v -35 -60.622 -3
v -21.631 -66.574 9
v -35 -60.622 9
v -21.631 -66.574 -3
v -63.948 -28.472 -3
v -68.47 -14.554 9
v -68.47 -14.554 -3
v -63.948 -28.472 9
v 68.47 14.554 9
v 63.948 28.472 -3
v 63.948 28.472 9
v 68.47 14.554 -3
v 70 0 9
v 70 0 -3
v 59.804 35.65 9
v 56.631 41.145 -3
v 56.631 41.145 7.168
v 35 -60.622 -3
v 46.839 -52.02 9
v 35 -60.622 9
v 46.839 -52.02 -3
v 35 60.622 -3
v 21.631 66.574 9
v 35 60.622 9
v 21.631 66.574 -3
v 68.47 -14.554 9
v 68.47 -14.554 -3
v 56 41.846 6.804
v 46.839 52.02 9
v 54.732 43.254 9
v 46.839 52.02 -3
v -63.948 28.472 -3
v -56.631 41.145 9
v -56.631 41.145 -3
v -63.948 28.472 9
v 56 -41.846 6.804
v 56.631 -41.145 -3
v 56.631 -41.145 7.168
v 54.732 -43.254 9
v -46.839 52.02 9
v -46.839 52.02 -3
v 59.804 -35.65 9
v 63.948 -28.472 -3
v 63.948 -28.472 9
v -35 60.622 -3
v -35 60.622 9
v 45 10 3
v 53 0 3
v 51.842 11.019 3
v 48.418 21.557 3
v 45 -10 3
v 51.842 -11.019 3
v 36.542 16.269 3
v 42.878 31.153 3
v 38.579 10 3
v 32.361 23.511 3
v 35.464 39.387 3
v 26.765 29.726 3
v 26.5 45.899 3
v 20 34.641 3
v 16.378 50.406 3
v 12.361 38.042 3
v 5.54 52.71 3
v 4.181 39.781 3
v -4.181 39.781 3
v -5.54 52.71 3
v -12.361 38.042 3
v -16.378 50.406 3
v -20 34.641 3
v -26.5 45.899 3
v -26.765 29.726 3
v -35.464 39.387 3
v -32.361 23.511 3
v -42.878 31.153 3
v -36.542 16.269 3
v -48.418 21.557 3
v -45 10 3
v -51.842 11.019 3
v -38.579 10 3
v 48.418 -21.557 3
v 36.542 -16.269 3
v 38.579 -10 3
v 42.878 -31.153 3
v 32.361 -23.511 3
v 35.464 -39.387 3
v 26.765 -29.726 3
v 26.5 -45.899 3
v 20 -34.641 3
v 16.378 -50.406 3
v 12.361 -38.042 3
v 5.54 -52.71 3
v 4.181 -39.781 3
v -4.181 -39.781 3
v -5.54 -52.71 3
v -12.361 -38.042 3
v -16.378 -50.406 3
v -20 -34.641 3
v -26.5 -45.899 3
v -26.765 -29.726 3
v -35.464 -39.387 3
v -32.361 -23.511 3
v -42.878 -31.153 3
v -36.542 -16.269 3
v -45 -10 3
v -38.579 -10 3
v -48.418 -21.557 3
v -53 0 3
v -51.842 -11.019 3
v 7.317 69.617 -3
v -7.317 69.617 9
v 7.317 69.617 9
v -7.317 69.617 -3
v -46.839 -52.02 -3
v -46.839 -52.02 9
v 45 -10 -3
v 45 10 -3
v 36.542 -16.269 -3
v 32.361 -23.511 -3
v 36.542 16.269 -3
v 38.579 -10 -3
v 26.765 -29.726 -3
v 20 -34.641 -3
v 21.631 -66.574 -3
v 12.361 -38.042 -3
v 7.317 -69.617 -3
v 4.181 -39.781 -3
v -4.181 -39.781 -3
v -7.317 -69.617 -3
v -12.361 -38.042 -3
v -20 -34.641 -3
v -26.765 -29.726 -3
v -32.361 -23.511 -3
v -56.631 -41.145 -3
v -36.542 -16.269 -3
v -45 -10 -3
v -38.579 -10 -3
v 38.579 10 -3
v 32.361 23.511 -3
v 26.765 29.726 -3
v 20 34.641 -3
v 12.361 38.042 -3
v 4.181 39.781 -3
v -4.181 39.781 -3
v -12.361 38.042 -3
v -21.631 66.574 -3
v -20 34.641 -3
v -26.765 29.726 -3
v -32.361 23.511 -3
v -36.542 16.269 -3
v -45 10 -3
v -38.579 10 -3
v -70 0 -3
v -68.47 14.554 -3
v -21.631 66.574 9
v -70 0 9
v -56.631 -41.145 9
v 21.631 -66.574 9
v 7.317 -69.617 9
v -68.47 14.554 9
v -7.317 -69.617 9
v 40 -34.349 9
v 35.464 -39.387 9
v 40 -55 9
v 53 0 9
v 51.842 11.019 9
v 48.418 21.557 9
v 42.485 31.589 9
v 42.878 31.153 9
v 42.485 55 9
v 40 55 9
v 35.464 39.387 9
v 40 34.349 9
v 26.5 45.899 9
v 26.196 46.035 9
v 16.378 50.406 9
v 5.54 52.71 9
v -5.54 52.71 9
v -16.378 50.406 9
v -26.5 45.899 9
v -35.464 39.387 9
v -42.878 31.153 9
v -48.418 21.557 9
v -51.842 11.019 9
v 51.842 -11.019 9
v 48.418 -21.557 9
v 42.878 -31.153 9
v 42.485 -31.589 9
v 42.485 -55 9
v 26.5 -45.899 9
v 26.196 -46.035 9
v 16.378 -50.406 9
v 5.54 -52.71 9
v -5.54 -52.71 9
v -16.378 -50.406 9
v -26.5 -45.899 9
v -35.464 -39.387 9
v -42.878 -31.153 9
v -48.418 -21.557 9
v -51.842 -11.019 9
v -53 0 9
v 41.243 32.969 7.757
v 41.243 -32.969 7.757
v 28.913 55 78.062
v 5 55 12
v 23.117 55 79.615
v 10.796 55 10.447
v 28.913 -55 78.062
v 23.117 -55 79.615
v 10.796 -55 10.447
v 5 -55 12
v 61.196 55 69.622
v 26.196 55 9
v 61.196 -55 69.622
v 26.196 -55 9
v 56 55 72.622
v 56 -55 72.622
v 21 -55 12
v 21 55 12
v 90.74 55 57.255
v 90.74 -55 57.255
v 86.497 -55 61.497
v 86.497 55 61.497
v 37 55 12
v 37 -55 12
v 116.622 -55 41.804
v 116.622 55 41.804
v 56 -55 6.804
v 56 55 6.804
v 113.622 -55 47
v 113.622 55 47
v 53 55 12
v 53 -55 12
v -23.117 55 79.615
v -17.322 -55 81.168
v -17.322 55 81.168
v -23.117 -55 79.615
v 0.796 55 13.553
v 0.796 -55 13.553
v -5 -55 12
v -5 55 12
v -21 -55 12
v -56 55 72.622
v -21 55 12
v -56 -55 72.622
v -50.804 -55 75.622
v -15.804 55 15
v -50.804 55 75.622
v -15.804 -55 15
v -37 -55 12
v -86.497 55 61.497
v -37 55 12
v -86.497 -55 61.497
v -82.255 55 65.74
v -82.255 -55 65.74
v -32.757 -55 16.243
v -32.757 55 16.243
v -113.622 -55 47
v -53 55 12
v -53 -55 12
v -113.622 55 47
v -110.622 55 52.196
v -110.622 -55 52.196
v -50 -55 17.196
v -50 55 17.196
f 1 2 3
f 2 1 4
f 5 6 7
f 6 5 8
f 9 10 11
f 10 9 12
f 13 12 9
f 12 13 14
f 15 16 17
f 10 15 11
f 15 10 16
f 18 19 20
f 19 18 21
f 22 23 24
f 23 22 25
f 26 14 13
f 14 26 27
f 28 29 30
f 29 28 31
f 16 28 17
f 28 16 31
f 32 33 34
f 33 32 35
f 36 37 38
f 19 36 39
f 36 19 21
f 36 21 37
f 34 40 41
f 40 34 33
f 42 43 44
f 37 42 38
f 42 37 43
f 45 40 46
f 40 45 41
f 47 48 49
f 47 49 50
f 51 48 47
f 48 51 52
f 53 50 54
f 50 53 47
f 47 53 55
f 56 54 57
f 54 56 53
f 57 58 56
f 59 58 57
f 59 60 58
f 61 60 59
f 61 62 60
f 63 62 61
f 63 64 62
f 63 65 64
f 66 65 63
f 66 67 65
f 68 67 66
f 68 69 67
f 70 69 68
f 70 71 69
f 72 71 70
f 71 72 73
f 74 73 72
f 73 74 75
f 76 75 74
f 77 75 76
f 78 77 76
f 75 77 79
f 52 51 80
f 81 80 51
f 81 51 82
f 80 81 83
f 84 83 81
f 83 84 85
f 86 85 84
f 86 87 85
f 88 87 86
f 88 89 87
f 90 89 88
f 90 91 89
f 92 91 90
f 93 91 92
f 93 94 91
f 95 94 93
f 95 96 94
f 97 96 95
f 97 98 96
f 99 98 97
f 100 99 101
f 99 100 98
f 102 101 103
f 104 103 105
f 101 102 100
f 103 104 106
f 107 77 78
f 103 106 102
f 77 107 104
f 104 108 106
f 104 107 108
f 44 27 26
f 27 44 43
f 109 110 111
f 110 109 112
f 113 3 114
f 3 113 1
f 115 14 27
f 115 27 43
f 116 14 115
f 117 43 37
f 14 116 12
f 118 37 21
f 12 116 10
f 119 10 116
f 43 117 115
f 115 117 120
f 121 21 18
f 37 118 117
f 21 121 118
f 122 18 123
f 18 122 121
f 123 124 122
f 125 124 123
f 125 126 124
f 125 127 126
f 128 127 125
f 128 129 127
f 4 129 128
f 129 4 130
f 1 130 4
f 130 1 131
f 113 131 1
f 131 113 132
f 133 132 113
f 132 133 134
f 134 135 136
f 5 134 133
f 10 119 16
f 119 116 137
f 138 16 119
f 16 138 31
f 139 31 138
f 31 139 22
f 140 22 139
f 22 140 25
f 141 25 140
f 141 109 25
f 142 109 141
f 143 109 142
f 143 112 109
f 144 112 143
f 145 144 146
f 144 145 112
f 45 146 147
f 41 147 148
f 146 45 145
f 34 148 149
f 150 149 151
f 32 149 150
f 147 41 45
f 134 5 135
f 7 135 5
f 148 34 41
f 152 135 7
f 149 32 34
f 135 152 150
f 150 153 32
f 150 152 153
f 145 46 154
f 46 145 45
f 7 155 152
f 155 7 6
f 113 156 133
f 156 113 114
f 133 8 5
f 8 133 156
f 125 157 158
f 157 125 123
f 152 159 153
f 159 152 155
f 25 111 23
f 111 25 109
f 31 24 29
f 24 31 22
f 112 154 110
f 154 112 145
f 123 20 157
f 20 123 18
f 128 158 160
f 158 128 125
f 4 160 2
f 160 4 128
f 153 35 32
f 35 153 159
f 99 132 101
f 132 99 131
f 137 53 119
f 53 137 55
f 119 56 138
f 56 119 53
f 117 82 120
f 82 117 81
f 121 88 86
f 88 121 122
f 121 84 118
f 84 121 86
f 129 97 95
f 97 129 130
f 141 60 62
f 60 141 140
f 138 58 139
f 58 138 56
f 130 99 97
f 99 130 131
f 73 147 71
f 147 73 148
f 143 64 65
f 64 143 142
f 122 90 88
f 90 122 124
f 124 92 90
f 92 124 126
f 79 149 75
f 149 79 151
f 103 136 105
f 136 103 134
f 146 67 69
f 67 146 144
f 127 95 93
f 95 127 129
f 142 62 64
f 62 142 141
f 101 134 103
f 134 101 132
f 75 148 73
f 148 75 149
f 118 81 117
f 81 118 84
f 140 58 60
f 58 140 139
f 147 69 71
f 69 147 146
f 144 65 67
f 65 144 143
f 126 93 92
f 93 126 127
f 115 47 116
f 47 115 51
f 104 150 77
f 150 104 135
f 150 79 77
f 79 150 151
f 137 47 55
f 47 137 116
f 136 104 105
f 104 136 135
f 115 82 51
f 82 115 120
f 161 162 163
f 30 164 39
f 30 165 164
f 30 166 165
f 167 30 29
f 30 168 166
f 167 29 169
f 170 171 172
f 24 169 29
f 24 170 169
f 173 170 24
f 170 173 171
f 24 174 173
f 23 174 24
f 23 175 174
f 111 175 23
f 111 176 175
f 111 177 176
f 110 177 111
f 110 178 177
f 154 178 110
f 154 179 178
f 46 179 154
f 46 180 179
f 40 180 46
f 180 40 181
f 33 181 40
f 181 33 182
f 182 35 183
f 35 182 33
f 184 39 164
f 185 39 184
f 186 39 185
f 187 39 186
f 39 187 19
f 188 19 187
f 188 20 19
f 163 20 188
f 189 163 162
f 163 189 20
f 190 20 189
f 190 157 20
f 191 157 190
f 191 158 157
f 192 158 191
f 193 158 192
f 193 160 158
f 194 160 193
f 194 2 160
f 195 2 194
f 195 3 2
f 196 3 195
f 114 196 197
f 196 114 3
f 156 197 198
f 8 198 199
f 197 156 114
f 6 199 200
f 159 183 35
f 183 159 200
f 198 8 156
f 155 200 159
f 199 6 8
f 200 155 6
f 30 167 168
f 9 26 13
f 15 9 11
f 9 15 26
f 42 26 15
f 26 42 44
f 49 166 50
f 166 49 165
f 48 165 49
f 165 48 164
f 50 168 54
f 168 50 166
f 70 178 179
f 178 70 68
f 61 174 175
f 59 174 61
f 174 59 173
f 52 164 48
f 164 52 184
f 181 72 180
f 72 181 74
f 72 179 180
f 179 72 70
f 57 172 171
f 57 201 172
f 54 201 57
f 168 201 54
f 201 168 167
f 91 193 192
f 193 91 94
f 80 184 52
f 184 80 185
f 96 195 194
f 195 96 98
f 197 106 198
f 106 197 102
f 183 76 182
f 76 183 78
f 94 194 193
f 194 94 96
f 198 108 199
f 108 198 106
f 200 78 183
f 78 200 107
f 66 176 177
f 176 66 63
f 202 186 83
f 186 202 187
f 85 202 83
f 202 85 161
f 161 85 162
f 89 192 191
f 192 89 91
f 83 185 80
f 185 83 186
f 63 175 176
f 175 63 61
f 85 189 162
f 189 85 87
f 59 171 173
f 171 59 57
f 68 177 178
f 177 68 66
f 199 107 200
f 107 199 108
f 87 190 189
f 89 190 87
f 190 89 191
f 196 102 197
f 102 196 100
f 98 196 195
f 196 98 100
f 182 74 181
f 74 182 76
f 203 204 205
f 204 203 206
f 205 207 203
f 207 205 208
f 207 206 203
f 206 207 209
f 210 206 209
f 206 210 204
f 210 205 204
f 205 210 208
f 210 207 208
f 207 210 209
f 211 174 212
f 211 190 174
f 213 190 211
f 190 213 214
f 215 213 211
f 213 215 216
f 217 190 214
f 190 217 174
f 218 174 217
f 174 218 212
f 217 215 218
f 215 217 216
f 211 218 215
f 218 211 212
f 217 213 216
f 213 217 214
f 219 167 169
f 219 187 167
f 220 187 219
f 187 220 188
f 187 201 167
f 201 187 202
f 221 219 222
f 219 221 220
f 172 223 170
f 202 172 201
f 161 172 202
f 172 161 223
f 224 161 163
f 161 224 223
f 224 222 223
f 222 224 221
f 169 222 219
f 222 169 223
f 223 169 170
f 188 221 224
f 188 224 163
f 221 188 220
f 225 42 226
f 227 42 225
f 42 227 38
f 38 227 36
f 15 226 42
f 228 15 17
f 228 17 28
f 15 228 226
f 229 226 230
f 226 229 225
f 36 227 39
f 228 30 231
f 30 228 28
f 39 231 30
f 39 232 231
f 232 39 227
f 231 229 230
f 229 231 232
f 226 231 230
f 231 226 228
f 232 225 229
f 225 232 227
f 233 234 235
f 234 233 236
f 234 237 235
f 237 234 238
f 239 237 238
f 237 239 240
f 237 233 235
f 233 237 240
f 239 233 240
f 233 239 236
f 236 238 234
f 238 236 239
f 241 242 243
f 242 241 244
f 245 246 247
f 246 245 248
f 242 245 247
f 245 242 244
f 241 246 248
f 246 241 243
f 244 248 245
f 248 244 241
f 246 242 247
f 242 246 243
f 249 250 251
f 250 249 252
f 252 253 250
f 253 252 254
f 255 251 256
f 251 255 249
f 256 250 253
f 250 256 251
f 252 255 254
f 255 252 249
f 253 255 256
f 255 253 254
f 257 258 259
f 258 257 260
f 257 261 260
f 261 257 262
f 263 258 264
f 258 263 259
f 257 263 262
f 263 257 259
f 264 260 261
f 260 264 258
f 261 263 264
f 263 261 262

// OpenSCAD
$materialThickness = 6;
$mountingRadiusHorn = 60;
$hornLength1400Hz = 70;
$hornThroatRadius1400Hz = 5;


module tube(height, outerRadius, innerRadius) {
    difference() {
        cylinder(h=height, r=outerRadius, center=true);
        cylinder(h=height, r=innerRadius, center=true);
    }
}


module DriverMountRST28F() {
    difference() {
        tube(height=$materialThickness, outerRadius=$mountingRadiusHorn+10, innerRadius=40);
        cube([90, 20, $materialThickness], center=true);
    }
}

module Horn() {
    tube(height=$materialThickness, outerRadius=$mountingRadiusHorn+10, innerRadius=53);
    
    translate([$hornThroatRadius1400Hz, -55, 6]) 
    rotate([0, 15, 0])
        cube([$materialThickness, 110, $hornLength1400Hz]);
    
    translate([$hornThroatRadius1400Hz+16, -55, 6])
    rotate([0, 30, 0])
        cube([$materialThickness, 110, $hornLength1400Hz]);
        
    translate([$hornThroatRadius1400Hz+32, -55, 6])
    rotate([0, 45, 0])
        cube([$materialThickness, 110, $hornLength1400Hz]);
    
    translate([$hornThroatRadius1400Hz+48, -55, 6])
    rotate([0, 60, 0])
        cube([$materialThickness, 110, $hornLength1400Hz]);
    
    translate([-($hornThroatRadius1400Hz), -55, 6])
    rotate([0, -15, 0])
        cube([$materialThickness, 110, $hornLength1400Hz]);
    
    translate([-($hornThroatRadius1400Hz+16), -55, 6])
    rotate([0, -30, 0])
        cube([$materialThickness, 110, $hornLength1400Hz]);
        
    translate([-($hornThroatRadius1400Hz+32), -55, 6])
    rotate([0, -45, 0])
        cube([$materialThickness, 110, $hornLength1400Hz]);
    
    translate([-($hornThroatRadius1400Hz+48), -55, 6])
    rotate([0, -60, 0])
        cube([$materialThickness, 110, $hornLength1400Hz]);
}


DriverMountRST28F();

translate([0, 0, 6]) Horn();
    
